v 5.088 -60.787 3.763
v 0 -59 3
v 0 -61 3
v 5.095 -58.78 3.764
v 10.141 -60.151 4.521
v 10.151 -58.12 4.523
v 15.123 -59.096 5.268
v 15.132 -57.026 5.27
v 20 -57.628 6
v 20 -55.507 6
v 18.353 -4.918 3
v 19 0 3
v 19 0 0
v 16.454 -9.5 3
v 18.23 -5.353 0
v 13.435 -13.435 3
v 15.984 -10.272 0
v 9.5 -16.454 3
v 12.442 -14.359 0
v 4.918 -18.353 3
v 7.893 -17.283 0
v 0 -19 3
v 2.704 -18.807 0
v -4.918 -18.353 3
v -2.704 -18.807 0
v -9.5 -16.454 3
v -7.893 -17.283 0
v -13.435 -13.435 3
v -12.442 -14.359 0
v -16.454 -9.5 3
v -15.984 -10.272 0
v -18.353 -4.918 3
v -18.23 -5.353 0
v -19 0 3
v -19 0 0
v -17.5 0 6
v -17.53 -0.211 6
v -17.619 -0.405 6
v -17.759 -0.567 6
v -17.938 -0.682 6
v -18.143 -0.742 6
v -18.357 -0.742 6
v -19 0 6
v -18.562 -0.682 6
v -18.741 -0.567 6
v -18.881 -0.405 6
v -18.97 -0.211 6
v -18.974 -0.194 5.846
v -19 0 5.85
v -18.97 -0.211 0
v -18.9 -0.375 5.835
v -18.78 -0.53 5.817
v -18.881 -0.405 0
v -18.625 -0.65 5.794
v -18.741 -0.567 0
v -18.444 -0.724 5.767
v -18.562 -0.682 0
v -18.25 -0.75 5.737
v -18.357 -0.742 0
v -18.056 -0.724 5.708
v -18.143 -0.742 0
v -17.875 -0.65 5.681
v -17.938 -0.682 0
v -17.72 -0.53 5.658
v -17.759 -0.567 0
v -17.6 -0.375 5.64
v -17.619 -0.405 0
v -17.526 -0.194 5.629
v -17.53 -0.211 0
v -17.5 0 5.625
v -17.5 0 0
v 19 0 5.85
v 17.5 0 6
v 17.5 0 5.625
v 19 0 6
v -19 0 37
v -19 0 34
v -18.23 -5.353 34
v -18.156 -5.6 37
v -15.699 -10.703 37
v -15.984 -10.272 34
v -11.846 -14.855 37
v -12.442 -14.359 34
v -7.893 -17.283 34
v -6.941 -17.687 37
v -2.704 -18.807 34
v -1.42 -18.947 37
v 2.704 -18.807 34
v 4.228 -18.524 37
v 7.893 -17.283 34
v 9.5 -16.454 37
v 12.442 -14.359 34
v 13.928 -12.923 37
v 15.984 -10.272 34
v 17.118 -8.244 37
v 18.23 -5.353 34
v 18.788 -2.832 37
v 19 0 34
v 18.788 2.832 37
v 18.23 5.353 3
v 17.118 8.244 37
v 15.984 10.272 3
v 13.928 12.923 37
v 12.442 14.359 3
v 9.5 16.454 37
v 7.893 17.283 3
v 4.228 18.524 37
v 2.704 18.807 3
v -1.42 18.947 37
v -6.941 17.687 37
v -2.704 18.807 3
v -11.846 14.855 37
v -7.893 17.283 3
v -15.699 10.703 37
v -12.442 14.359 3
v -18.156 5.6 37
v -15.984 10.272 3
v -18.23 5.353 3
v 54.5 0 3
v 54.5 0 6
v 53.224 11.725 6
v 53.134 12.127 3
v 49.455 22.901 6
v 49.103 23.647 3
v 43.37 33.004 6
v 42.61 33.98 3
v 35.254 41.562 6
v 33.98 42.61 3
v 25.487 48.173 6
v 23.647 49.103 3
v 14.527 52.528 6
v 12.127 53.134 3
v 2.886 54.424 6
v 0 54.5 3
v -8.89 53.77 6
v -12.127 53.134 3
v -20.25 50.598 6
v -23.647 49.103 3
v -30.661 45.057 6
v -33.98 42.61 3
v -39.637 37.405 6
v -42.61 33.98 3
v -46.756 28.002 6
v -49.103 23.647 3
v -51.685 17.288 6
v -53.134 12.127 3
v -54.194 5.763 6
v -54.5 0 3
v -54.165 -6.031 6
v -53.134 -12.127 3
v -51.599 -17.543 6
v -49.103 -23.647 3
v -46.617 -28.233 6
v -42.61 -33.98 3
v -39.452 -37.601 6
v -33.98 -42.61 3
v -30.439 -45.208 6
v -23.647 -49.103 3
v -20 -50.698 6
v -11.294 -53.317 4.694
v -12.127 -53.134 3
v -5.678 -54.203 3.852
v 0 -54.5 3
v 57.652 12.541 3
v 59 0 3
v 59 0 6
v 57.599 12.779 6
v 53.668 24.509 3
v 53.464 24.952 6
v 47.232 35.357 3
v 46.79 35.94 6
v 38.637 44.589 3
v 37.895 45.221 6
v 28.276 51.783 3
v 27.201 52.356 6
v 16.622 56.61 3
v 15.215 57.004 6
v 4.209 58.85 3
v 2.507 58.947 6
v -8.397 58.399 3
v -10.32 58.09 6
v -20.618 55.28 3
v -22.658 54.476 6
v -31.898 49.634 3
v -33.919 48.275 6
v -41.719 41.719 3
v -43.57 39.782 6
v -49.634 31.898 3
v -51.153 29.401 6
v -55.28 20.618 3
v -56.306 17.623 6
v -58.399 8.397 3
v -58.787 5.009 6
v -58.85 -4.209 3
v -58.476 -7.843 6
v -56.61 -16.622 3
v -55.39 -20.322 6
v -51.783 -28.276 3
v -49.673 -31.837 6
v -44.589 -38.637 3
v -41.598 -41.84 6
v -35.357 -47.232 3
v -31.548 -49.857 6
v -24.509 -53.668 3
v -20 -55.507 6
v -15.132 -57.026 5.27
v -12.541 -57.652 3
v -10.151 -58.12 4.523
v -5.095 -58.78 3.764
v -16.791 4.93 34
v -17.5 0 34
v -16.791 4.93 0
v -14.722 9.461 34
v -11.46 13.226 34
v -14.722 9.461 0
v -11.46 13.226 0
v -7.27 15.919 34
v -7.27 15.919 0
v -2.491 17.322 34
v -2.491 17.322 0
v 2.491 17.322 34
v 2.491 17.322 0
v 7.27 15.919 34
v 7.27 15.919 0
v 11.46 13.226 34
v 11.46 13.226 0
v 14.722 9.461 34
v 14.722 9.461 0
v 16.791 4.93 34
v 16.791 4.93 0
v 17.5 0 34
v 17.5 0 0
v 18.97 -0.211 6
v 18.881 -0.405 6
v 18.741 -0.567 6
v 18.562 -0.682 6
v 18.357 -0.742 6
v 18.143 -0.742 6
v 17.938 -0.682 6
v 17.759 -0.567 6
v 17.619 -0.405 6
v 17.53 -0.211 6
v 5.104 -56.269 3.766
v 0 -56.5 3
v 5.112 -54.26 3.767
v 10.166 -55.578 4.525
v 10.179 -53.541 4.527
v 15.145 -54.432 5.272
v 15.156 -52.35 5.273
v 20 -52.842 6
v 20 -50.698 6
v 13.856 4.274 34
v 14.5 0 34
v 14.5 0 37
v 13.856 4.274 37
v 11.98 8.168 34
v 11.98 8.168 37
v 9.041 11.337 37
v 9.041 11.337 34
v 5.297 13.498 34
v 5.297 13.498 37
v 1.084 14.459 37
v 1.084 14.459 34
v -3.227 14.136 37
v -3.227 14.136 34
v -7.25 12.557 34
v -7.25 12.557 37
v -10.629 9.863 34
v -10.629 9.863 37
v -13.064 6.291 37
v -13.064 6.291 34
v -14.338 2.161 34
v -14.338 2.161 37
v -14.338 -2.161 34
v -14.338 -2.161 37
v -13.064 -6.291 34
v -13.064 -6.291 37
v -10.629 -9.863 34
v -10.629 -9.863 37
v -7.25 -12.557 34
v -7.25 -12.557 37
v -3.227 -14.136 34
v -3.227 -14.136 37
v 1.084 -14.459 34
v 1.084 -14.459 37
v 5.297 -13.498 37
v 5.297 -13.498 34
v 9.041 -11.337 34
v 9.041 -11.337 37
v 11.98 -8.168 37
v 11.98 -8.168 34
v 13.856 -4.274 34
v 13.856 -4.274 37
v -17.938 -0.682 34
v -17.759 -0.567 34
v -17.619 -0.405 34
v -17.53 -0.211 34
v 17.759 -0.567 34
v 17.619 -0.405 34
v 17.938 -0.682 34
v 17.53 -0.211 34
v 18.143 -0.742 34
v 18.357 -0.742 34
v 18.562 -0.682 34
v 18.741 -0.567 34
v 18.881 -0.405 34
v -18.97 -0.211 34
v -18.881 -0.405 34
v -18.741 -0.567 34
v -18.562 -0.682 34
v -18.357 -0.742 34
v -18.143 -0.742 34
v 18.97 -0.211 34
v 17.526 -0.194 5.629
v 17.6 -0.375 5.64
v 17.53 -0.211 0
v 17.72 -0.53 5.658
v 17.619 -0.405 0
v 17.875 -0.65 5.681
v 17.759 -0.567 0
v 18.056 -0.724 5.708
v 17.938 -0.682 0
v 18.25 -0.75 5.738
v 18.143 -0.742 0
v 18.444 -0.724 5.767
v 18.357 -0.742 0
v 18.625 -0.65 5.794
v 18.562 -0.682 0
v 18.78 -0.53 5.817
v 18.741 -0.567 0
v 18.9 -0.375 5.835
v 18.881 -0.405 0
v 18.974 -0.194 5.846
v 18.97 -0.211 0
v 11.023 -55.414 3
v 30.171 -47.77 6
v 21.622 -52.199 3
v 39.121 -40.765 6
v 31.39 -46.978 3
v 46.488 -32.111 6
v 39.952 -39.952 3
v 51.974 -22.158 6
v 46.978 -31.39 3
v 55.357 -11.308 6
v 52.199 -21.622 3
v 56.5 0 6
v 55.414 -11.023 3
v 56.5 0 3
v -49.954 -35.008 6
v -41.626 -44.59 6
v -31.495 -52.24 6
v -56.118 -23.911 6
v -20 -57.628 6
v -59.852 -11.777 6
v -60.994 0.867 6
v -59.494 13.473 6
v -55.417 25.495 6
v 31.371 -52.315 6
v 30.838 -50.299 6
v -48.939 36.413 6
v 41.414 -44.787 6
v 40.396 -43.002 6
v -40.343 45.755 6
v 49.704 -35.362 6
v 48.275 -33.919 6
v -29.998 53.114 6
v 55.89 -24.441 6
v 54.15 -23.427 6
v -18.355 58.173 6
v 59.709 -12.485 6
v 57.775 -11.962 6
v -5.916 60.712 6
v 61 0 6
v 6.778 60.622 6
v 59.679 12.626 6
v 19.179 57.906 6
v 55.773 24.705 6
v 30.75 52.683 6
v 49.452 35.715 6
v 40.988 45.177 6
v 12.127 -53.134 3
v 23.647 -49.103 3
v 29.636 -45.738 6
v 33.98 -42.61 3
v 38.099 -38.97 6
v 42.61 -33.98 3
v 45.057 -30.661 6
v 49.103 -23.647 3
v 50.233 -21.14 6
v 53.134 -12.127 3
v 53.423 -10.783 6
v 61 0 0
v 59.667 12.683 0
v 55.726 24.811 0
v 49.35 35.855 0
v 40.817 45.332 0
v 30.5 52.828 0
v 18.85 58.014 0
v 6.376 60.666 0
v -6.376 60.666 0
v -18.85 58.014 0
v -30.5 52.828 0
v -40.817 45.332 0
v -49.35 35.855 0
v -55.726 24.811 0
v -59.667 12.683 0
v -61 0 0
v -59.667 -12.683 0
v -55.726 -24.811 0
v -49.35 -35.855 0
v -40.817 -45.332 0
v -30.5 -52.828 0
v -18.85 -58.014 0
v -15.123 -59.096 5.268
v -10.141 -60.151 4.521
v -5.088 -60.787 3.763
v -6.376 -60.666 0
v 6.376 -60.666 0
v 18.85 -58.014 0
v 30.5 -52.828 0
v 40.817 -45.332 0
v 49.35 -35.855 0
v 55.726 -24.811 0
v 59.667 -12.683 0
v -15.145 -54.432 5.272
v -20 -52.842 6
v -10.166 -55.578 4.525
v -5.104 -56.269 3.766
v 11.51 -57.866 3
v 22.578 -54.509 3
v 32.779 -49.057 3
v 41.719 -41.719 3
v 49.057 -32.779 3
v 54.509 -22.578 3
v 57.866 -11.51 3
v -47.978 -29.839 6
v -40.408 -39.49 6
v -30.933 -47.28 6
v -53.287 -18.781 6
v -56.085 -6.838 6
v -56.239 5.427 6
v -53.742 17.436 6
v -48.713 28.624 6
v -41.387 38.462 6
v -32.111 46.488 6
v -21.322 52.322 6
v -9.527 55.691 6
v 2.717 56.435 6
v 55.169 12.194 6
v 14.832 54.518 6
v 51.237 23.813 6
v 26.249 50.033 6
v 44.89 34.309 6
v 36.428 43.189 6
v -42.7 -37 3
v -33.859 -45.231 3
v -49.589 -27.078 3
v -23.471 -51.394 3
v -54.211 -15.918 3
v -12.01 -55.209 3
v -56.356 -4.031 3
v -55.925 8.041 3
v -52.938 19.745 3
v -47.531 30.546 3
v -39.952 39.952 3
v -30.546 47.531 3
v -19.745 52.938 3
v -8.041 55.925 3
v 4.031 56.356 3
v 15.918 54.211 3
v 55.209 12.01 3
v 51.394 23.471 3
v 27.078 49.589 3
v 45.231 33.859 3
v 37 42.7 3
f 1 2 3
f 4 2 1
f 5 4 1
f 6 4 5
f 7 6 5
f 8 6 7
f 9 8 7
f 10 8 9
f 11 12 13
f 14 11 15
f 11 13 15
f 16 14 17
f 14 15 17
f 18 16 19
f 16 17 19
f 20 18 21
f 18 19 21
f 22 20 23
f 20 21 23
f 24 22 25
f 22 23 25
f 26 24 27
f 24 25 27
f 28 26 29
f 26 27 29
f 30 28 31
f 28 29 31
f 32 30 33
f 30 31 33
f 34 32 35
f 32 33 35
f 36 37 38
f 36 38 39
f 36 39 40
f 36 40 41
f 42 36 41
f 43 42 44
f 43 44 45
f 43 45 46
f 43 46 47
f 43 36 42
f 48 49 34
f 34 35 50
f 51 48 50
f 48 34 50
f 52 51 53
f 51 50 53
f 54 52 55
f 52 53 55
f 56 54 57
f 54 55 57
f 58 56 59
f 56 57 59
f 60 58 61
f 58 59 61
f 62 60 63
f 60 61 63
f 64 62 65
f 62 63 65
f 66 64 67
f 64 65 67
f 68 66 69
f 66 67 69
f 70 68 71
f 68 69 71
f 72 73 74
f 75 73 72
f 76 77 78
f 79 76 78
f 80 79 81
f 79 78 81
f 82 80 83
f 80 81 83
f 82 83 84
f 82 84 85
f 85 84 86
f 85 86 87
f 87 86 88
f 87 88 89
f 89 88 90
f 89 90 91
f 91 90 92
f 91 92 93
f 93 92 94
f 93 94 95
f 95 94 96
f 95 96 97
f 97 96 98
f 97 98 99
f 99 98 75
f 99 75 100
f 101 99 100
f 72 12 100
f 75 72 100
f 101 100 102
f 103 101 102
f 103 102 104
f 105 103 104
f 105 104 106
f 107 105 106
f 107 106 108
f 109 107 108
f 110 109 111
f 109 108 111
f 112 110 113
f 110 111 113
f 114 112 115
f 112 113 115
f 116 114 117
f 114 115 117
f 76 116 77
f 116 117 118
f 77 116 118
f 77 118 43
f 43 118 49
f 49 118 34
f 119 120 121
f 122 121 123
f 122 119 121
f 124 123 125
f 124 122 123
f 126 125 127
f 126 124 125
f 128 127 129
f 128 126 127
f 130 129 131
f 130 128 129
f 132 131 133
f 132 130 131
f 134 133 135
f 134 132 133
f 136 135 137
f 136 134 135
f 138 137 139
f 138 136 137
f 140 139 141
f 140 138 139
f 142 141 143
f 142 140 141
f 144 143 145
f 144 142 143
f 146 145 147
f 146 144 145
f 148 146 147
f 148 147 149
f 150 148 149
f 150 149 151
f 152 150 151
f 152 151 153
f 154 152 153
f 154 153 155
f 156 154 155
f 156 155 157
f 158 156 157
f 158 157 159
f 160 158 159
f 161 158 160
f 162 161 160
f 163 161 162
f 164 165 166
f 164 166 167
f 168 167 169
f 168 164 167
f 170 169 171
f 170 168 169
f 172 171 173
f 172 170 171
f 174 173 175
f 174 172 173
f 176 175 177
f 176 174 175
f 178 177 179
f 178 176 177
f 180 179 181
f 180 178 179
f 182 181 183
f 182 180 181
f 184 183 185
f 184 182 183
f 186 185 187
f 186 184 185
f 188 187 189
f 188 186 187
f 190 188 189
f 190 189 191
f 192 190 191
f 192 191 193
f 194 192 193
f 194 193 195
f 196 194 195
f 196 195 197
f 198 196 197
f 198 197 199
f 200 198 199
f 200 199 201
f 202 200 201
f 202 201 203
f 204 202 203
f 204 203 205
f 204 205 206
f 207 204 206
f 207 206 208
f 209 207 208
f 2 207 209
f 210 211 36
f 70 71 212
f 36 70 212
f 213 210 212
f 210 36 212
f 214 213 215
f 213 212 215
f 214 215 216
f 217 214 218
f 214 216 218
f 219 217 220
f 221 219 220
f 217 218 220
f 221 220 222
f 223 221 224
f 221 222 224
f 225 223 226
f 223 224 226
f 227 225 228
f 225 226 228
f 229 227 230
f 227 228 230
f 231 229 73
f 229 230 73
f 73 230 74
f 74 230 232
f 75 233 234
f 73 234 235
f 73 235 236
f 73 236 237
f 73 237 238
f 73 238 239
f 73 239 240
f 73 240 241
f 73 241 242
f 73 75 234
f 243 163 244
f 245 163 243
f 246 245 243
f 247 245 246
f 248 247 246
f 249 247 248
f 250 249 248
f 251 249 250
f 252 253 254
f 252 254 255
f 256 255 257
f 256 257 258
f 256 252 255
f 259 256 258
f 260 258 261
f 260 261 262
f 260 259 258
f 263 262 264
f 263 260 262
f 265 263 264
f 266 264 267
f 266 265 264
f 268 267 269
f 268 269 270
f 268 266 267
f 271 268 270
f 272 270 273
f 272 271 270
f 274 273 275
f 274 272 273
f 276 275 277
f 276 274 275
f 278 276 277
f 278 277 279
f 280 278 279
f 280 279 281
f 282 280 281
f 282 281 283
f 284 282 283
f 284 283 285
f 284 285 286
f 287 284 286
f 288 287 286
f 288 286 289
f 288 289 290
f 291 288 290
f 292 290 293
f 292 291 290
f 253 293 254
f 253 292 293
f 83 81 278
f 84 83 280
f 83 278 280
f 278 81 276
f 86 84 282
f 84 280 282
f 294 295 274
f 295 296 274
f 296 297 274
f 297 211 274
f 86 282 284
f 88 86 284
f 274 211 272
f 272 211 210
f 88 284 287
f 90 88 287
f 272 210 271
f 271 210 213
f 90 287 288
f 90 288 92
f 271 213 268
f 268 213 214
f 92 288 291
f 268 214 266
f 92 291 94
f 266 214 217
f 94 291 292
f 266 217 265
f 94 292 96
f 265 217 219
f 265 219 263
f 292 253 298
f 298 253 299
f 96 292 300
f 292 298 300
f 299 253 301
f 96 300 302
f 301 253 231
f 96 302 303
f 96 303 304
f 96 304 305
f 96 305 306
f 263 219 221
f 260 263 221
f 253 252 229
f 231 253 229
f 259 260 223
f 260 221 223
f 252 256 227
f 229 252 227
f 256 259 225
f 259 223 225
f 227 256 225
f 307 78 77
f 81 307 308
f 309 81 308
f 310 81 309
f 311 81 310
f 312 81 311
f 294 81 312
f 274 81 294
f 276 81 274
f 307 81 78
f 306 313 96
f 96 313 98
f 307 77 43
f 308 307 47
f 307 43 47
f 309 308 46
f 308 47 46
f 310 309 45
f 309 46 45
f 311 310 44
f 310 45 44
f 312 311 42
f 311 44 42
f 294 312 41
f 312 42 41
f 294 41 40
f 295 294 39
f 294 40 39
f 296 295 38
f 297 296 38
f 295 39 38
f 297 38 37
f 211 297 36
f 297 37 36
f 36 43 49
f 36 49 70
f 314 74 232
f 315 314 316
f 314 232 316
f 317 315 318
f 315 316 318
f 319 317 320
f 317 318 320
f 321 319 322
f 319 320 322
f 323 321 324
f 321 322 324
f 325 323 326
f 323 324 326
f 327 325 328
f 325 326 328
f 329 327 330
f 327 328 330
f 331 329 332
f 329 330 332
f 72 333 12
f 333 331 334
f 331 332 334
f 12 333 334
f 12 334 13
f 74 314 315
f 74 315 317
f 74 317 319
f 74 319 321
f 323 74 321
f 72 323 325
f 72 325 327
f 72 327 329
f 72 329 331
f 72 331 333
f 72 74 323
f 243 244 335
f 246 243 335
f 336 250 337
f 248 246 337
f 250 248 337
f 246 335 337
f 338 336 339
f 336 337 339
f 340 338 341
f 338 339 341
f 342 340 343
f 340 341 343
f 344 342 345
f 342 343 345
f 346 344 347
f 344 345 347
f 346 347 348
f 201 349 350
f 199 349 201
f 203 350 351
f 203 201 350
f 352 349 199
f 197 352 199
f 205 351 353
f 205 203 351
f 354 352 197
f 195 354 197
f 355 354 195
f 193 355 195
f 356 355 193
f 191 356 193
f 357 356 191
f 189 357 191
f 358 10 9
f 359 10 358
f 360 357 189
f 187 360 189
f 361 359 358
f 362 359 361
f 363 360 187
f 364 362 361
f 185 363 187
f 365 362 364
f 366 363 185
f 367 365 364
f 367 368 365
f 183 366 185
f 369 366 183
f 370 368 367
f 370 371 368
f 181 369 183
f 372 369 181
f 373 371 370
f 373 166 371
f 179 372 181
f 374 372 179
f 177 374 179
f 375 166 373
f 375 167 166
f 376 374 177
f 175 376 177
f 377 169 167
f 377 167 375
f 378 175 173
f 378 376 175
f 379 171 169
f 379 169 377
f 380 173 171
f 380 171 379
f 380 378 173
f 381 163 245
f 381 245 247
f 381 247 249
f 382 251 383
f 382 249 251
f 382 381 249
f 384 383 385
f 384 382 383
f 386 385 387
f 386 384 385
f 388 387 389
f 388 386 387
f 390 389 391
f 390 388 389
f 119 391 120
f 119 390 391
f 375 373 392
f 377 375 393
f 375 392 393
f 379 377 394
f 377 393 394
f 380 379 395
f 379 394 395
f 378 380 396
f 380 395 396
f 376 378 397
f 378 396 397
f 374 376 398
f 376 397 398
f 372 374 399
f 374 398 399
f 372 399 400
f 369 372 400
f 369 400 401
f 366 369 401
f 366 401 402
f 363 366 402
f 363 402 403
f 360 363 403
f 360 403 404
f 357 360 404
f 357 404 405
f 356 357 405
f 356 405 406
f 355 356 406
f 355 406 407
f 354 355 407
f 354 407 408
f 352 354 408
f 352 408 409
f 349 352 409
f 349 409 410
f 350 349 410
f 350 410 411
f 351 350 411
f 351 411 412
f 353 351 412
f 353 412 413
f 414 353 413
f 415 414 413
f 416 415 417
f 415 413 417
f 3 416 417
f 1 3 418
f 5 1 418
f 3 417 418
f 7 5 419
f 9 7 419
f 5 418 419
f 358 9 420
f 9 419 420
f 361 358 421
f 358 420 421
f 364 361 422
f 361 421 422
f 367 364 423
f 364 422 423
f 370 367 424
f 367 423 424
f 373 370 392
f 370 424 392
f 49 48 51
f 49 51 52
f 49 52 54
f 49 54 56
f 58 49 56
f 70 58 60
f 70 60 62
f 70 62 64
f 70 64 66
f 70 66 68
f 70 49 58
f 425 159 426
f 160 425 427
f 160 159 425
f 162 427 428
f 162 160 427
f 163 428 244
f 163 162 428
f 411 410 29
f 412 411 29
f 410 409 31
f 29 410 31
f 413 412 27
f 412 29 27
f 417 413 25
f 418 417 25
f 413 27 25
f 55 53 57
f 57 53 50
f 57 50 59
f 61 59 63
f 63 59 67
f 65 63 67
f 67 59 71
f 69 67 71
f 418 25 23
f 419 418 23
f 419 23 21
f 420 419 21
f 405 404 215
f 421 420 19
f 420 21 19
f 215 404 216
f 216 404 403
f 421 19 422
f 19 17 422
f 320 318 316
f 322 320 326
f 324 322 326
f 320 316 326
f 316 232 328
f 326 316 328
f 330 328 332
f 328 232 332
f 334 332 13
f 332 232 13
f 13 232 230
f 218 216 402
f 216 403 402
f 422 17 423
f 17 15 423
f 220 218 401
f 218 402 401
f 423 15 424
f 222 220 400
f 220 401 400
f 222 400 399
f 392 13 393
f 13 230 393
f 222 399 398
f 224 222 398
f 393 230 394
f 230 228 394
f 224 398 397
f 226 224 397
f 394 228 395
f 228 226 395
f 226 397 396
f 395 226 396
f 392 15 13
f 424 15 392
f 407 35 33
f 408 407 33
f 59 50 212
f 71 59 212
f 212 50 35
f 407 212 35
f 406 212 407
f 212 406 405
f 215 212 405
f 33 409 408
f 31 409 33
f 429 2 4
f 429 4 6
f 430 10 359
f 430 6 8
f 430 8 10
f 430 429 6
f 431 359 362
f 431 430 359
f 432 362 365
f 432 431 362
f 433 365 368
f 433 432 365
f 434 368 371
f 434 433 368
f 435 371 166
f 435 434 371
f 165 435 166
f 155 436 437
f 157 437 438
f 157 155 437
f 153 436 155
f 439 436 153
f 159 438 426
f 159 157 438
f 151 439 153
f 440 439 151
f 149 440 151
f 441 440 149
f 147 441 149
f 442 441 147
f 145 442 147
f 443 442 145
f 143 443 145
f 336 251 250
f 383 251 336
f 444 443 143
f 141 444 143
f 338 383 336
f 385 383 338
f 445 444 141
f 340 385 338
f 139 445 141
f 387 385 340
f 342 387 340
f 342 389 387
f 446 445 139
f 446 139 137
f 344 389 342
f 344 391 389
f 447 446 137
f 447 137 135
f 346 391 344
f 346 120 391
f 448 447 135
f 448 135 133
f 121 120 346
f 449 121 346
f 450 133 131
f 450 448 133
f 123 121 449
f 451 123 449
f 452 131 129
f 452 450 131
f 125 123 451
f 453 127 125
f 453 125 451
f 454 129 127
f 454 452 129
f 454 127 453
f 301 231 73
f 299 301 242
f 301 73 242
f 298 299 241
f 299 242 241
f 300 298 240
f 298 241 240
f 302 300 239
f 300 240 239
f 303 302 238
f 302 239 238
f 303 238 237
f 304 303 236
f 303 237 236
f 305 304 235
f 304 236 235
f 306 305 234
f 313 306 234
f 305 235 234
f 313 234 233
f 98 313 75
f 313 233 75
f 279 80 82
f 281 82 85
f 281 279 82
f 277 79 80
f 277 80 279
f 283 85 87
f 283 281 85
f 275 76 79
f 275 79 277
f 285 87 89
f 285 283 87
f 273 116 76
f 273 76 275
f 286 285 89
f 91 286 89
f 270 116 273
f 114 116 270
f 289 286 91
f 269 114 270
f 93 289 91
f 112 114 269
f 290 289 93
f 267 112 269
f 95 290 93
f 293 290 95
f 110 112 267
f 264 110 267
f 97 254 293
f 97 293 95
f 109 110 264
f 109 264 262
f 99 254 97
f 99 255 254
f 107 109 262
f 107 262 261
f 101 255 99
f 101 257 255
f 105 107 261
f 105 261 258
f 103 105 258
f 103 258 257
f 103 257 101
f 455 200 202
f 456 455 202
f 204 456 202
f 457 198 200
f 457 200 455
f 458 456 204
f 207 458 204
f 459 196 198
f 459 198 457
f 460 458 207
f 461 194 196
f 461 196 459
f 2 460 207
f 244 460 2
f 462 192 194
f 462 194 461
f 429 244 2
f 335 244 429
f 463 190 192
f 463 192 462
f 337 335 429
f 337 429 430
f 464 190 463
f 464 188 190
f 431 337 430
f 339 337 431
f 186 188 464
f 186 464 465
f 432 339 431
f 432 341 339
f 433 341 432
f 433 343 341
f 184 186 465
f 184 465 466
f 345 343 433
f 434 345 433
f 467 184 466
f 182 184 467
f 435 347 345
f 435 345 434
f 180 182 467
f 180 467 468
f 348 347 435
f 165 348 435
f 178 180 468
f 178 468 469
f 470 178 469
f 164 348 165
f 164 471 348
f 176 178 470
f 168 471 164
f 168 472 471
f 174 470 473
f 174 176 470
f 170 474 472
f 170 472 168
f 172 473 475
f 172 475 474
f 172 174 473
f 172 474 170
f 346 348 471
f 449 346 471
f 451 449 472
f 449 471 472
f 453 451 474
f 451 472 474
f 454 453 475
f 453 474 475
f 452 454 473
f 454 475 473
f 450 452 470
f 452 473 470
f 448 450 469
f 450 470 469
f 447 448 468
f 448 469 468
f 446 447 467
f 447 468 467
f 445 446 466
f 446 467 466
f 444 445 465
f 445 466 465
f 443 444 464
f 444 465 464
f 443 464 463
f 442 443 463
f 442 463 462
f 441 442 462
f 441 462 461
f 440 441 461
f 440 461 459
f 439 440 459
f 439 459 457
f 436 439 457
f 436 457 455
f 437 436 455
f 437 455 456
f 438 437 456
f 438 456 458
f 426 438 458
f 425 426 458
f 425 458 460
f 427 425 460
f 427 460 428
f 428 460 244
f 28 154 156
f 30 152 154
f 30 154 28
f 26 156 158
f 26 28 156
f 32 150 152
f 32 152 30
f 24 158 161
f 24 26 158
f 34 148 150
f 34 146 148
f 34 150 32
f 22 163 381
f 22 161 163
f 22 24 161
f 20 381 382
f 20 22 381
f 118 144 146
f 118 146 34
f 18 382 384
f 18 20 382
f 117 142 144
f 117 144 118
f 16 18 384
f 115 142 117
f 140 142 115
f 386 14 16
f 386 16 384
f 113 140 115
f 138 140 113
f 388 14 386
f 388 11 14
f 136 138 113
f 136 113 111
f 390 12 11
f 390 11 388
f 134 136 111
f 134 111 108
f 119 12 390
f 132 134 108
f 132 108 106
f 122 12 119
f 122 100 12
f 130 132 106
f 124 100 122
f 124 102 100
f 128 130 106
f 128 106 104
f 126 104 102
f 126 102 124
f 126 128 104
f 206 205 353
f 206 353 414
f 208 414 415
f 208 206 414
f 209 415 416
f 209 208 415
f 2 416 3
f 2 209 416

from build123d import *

# Parameters (mm, degrees)
F1_DEPTH = 34
F0_R     = 61
F0_R_2   = 59
F0_R_3   = 56.5
F0_R_4   = 54.5
F2_DEPTH = 3
F3_START = 34
F0_R_5   = 14.5
F3_DEPTH = 3
F4_DEPTH = 6
F6_DEPTH = 61.001


with BuildPart() as f1:
    # F0 (on Top) → F1 (new body)
    with BuildSketch(Plane.XY):
        with BuildLine():
            ThreePointArc((-17.5, 0), (0, 17.5), (17.5, 0))
            ThreePointArc((17.5, 0), (18.25, 0.75), (19, 0))
            ThreePointArc((19, 0), (-2.7e-09, 19), (-19, -5.4e-09))
            ThreePointArc((-19, -5.4e-09), (-18.2500000027, 0.75), (-17.5, 0))
        make_face()
        with BuildLine():
            ThreePointArc((19, 0), (18.25, 0.75), (17.5, 0))
            ThreePointArc((17.5, 0), (18.25, -0.75), (19, 0))
        make_face()
        with BuildLine():
            ThreePointArc((-19, -5.4e-09), (-18.2499999973, -0.75), (-17.5, 0))
            ThreePointArc((-17.5, 0), (-18.2500000027, 0.75), (-19, -5.4e-09))
        make_face()
    extrude(amount=F1_DEPTH)

    # F0 (on Top) → F2 (join)
    with BuildSketch(Plane.XY):
        Circle(F0_R)
        Circle(F0_R_2, mode=Mode.SUBTRACT)
        Circle(F0_R_2)
        Circle(F0_R_3, mode=Mode.SUBTRACT)
        Circle(F0_R_3)
        Circle(F0_R_4, mode=Mode.SUBTRACT)
        Circle(F0_R_4)
        with BuildLine():
            ThreePointArc((-19, -5.4e-09), (-2.7e-09, 19), (19, 0))
            ThreePointArc((19, 0), (2.7e-09, -19), (-19, -5.4e-09))
        make_face(mode=Mode.SUBTRACT)
    extrude(amount=F2_DEPTH)

    # F0 (on Top) → F3 (join)
    with BuildSketch(Plane.XY.offset(F3_START)):
        with BuildLine():
            ThreePointArc((-17.5, 0), (0, -17.5), (17.5, 0))
            ThreePointArc((17.5, 0), (0, 17.5), (-17.5, 0))
        make_face()
        Circle(F0_R_5, mode=Mode.SUBTRACT)
        with BuildLine():
            ThreePointArc((-17.5, 0), (0, 17.5), (17.5, 0))
            ThreePointArc((17.5, 0), (18.25, 0.75), (19, 0))
            ThreePointArc((19, 0), (-2.7e-09, 19), (-19, -5.4e-09))
            ThreePointArc((-19, -5.4e-09), (-18.2500000027, 0.75), (-17.5, 0))
        make_face()
        with BuildLine():
            ThreePointArc((19, 0), (18.25, 0.75), (17.5, 0))
            ThreePointArc((17.5, 0), (18.25, -0.75), (19, 0))
        make_face()
        with BuildLine():
            ThreePointArc((-19, -5.4e-09), (-18.2499999973, -0.75), (-17.5, 0))
            ThreePointArc((-17.5, 0), (-18.2500000027, 0.75), (-19, -5.4e-09))
        make_face()
        with BuildLine():
            ThreePointArc((19, 0), (18.25, -0.75), (17.5, 0))
            ThreePointArc((17.5, 0), (0, -17.5), (-17.5, 0))
            ThreePointArc((-17.5, 0), (-18.2499999973, -0.75), (-19, -5.4e-09))
            ThreePointArc((-19, -5.4e-09), (2.7e-09, -19), (19, 0))
        make_face()
    extrude(amount=F3_DEPTH)

    # F0 (on Top) → F4 (join)
    with BuildSketch(Plane.XY):
        Circle(F0_R)
        Circle(F0_R_2, mode=Mode.SUBTRACT)
        Circle(F0_R_3)
        Circle(F0_R_4, mode=Mode.SUBTRACT)
    extrude(amount=F4_DEPTH)

    # F5 (on Front) → F6 (cut, through all)
    with BuildSketch(Plane.XZ):
        Polygon((-20, 6), (0, 3), (0, 6), align=None)
        Polygon((0, 6), (0, 3), (20, 6), align=None)
    extrude(amount=F6_DEPTH, mode=Mode.SUBTRACT)


solid = f1.part
